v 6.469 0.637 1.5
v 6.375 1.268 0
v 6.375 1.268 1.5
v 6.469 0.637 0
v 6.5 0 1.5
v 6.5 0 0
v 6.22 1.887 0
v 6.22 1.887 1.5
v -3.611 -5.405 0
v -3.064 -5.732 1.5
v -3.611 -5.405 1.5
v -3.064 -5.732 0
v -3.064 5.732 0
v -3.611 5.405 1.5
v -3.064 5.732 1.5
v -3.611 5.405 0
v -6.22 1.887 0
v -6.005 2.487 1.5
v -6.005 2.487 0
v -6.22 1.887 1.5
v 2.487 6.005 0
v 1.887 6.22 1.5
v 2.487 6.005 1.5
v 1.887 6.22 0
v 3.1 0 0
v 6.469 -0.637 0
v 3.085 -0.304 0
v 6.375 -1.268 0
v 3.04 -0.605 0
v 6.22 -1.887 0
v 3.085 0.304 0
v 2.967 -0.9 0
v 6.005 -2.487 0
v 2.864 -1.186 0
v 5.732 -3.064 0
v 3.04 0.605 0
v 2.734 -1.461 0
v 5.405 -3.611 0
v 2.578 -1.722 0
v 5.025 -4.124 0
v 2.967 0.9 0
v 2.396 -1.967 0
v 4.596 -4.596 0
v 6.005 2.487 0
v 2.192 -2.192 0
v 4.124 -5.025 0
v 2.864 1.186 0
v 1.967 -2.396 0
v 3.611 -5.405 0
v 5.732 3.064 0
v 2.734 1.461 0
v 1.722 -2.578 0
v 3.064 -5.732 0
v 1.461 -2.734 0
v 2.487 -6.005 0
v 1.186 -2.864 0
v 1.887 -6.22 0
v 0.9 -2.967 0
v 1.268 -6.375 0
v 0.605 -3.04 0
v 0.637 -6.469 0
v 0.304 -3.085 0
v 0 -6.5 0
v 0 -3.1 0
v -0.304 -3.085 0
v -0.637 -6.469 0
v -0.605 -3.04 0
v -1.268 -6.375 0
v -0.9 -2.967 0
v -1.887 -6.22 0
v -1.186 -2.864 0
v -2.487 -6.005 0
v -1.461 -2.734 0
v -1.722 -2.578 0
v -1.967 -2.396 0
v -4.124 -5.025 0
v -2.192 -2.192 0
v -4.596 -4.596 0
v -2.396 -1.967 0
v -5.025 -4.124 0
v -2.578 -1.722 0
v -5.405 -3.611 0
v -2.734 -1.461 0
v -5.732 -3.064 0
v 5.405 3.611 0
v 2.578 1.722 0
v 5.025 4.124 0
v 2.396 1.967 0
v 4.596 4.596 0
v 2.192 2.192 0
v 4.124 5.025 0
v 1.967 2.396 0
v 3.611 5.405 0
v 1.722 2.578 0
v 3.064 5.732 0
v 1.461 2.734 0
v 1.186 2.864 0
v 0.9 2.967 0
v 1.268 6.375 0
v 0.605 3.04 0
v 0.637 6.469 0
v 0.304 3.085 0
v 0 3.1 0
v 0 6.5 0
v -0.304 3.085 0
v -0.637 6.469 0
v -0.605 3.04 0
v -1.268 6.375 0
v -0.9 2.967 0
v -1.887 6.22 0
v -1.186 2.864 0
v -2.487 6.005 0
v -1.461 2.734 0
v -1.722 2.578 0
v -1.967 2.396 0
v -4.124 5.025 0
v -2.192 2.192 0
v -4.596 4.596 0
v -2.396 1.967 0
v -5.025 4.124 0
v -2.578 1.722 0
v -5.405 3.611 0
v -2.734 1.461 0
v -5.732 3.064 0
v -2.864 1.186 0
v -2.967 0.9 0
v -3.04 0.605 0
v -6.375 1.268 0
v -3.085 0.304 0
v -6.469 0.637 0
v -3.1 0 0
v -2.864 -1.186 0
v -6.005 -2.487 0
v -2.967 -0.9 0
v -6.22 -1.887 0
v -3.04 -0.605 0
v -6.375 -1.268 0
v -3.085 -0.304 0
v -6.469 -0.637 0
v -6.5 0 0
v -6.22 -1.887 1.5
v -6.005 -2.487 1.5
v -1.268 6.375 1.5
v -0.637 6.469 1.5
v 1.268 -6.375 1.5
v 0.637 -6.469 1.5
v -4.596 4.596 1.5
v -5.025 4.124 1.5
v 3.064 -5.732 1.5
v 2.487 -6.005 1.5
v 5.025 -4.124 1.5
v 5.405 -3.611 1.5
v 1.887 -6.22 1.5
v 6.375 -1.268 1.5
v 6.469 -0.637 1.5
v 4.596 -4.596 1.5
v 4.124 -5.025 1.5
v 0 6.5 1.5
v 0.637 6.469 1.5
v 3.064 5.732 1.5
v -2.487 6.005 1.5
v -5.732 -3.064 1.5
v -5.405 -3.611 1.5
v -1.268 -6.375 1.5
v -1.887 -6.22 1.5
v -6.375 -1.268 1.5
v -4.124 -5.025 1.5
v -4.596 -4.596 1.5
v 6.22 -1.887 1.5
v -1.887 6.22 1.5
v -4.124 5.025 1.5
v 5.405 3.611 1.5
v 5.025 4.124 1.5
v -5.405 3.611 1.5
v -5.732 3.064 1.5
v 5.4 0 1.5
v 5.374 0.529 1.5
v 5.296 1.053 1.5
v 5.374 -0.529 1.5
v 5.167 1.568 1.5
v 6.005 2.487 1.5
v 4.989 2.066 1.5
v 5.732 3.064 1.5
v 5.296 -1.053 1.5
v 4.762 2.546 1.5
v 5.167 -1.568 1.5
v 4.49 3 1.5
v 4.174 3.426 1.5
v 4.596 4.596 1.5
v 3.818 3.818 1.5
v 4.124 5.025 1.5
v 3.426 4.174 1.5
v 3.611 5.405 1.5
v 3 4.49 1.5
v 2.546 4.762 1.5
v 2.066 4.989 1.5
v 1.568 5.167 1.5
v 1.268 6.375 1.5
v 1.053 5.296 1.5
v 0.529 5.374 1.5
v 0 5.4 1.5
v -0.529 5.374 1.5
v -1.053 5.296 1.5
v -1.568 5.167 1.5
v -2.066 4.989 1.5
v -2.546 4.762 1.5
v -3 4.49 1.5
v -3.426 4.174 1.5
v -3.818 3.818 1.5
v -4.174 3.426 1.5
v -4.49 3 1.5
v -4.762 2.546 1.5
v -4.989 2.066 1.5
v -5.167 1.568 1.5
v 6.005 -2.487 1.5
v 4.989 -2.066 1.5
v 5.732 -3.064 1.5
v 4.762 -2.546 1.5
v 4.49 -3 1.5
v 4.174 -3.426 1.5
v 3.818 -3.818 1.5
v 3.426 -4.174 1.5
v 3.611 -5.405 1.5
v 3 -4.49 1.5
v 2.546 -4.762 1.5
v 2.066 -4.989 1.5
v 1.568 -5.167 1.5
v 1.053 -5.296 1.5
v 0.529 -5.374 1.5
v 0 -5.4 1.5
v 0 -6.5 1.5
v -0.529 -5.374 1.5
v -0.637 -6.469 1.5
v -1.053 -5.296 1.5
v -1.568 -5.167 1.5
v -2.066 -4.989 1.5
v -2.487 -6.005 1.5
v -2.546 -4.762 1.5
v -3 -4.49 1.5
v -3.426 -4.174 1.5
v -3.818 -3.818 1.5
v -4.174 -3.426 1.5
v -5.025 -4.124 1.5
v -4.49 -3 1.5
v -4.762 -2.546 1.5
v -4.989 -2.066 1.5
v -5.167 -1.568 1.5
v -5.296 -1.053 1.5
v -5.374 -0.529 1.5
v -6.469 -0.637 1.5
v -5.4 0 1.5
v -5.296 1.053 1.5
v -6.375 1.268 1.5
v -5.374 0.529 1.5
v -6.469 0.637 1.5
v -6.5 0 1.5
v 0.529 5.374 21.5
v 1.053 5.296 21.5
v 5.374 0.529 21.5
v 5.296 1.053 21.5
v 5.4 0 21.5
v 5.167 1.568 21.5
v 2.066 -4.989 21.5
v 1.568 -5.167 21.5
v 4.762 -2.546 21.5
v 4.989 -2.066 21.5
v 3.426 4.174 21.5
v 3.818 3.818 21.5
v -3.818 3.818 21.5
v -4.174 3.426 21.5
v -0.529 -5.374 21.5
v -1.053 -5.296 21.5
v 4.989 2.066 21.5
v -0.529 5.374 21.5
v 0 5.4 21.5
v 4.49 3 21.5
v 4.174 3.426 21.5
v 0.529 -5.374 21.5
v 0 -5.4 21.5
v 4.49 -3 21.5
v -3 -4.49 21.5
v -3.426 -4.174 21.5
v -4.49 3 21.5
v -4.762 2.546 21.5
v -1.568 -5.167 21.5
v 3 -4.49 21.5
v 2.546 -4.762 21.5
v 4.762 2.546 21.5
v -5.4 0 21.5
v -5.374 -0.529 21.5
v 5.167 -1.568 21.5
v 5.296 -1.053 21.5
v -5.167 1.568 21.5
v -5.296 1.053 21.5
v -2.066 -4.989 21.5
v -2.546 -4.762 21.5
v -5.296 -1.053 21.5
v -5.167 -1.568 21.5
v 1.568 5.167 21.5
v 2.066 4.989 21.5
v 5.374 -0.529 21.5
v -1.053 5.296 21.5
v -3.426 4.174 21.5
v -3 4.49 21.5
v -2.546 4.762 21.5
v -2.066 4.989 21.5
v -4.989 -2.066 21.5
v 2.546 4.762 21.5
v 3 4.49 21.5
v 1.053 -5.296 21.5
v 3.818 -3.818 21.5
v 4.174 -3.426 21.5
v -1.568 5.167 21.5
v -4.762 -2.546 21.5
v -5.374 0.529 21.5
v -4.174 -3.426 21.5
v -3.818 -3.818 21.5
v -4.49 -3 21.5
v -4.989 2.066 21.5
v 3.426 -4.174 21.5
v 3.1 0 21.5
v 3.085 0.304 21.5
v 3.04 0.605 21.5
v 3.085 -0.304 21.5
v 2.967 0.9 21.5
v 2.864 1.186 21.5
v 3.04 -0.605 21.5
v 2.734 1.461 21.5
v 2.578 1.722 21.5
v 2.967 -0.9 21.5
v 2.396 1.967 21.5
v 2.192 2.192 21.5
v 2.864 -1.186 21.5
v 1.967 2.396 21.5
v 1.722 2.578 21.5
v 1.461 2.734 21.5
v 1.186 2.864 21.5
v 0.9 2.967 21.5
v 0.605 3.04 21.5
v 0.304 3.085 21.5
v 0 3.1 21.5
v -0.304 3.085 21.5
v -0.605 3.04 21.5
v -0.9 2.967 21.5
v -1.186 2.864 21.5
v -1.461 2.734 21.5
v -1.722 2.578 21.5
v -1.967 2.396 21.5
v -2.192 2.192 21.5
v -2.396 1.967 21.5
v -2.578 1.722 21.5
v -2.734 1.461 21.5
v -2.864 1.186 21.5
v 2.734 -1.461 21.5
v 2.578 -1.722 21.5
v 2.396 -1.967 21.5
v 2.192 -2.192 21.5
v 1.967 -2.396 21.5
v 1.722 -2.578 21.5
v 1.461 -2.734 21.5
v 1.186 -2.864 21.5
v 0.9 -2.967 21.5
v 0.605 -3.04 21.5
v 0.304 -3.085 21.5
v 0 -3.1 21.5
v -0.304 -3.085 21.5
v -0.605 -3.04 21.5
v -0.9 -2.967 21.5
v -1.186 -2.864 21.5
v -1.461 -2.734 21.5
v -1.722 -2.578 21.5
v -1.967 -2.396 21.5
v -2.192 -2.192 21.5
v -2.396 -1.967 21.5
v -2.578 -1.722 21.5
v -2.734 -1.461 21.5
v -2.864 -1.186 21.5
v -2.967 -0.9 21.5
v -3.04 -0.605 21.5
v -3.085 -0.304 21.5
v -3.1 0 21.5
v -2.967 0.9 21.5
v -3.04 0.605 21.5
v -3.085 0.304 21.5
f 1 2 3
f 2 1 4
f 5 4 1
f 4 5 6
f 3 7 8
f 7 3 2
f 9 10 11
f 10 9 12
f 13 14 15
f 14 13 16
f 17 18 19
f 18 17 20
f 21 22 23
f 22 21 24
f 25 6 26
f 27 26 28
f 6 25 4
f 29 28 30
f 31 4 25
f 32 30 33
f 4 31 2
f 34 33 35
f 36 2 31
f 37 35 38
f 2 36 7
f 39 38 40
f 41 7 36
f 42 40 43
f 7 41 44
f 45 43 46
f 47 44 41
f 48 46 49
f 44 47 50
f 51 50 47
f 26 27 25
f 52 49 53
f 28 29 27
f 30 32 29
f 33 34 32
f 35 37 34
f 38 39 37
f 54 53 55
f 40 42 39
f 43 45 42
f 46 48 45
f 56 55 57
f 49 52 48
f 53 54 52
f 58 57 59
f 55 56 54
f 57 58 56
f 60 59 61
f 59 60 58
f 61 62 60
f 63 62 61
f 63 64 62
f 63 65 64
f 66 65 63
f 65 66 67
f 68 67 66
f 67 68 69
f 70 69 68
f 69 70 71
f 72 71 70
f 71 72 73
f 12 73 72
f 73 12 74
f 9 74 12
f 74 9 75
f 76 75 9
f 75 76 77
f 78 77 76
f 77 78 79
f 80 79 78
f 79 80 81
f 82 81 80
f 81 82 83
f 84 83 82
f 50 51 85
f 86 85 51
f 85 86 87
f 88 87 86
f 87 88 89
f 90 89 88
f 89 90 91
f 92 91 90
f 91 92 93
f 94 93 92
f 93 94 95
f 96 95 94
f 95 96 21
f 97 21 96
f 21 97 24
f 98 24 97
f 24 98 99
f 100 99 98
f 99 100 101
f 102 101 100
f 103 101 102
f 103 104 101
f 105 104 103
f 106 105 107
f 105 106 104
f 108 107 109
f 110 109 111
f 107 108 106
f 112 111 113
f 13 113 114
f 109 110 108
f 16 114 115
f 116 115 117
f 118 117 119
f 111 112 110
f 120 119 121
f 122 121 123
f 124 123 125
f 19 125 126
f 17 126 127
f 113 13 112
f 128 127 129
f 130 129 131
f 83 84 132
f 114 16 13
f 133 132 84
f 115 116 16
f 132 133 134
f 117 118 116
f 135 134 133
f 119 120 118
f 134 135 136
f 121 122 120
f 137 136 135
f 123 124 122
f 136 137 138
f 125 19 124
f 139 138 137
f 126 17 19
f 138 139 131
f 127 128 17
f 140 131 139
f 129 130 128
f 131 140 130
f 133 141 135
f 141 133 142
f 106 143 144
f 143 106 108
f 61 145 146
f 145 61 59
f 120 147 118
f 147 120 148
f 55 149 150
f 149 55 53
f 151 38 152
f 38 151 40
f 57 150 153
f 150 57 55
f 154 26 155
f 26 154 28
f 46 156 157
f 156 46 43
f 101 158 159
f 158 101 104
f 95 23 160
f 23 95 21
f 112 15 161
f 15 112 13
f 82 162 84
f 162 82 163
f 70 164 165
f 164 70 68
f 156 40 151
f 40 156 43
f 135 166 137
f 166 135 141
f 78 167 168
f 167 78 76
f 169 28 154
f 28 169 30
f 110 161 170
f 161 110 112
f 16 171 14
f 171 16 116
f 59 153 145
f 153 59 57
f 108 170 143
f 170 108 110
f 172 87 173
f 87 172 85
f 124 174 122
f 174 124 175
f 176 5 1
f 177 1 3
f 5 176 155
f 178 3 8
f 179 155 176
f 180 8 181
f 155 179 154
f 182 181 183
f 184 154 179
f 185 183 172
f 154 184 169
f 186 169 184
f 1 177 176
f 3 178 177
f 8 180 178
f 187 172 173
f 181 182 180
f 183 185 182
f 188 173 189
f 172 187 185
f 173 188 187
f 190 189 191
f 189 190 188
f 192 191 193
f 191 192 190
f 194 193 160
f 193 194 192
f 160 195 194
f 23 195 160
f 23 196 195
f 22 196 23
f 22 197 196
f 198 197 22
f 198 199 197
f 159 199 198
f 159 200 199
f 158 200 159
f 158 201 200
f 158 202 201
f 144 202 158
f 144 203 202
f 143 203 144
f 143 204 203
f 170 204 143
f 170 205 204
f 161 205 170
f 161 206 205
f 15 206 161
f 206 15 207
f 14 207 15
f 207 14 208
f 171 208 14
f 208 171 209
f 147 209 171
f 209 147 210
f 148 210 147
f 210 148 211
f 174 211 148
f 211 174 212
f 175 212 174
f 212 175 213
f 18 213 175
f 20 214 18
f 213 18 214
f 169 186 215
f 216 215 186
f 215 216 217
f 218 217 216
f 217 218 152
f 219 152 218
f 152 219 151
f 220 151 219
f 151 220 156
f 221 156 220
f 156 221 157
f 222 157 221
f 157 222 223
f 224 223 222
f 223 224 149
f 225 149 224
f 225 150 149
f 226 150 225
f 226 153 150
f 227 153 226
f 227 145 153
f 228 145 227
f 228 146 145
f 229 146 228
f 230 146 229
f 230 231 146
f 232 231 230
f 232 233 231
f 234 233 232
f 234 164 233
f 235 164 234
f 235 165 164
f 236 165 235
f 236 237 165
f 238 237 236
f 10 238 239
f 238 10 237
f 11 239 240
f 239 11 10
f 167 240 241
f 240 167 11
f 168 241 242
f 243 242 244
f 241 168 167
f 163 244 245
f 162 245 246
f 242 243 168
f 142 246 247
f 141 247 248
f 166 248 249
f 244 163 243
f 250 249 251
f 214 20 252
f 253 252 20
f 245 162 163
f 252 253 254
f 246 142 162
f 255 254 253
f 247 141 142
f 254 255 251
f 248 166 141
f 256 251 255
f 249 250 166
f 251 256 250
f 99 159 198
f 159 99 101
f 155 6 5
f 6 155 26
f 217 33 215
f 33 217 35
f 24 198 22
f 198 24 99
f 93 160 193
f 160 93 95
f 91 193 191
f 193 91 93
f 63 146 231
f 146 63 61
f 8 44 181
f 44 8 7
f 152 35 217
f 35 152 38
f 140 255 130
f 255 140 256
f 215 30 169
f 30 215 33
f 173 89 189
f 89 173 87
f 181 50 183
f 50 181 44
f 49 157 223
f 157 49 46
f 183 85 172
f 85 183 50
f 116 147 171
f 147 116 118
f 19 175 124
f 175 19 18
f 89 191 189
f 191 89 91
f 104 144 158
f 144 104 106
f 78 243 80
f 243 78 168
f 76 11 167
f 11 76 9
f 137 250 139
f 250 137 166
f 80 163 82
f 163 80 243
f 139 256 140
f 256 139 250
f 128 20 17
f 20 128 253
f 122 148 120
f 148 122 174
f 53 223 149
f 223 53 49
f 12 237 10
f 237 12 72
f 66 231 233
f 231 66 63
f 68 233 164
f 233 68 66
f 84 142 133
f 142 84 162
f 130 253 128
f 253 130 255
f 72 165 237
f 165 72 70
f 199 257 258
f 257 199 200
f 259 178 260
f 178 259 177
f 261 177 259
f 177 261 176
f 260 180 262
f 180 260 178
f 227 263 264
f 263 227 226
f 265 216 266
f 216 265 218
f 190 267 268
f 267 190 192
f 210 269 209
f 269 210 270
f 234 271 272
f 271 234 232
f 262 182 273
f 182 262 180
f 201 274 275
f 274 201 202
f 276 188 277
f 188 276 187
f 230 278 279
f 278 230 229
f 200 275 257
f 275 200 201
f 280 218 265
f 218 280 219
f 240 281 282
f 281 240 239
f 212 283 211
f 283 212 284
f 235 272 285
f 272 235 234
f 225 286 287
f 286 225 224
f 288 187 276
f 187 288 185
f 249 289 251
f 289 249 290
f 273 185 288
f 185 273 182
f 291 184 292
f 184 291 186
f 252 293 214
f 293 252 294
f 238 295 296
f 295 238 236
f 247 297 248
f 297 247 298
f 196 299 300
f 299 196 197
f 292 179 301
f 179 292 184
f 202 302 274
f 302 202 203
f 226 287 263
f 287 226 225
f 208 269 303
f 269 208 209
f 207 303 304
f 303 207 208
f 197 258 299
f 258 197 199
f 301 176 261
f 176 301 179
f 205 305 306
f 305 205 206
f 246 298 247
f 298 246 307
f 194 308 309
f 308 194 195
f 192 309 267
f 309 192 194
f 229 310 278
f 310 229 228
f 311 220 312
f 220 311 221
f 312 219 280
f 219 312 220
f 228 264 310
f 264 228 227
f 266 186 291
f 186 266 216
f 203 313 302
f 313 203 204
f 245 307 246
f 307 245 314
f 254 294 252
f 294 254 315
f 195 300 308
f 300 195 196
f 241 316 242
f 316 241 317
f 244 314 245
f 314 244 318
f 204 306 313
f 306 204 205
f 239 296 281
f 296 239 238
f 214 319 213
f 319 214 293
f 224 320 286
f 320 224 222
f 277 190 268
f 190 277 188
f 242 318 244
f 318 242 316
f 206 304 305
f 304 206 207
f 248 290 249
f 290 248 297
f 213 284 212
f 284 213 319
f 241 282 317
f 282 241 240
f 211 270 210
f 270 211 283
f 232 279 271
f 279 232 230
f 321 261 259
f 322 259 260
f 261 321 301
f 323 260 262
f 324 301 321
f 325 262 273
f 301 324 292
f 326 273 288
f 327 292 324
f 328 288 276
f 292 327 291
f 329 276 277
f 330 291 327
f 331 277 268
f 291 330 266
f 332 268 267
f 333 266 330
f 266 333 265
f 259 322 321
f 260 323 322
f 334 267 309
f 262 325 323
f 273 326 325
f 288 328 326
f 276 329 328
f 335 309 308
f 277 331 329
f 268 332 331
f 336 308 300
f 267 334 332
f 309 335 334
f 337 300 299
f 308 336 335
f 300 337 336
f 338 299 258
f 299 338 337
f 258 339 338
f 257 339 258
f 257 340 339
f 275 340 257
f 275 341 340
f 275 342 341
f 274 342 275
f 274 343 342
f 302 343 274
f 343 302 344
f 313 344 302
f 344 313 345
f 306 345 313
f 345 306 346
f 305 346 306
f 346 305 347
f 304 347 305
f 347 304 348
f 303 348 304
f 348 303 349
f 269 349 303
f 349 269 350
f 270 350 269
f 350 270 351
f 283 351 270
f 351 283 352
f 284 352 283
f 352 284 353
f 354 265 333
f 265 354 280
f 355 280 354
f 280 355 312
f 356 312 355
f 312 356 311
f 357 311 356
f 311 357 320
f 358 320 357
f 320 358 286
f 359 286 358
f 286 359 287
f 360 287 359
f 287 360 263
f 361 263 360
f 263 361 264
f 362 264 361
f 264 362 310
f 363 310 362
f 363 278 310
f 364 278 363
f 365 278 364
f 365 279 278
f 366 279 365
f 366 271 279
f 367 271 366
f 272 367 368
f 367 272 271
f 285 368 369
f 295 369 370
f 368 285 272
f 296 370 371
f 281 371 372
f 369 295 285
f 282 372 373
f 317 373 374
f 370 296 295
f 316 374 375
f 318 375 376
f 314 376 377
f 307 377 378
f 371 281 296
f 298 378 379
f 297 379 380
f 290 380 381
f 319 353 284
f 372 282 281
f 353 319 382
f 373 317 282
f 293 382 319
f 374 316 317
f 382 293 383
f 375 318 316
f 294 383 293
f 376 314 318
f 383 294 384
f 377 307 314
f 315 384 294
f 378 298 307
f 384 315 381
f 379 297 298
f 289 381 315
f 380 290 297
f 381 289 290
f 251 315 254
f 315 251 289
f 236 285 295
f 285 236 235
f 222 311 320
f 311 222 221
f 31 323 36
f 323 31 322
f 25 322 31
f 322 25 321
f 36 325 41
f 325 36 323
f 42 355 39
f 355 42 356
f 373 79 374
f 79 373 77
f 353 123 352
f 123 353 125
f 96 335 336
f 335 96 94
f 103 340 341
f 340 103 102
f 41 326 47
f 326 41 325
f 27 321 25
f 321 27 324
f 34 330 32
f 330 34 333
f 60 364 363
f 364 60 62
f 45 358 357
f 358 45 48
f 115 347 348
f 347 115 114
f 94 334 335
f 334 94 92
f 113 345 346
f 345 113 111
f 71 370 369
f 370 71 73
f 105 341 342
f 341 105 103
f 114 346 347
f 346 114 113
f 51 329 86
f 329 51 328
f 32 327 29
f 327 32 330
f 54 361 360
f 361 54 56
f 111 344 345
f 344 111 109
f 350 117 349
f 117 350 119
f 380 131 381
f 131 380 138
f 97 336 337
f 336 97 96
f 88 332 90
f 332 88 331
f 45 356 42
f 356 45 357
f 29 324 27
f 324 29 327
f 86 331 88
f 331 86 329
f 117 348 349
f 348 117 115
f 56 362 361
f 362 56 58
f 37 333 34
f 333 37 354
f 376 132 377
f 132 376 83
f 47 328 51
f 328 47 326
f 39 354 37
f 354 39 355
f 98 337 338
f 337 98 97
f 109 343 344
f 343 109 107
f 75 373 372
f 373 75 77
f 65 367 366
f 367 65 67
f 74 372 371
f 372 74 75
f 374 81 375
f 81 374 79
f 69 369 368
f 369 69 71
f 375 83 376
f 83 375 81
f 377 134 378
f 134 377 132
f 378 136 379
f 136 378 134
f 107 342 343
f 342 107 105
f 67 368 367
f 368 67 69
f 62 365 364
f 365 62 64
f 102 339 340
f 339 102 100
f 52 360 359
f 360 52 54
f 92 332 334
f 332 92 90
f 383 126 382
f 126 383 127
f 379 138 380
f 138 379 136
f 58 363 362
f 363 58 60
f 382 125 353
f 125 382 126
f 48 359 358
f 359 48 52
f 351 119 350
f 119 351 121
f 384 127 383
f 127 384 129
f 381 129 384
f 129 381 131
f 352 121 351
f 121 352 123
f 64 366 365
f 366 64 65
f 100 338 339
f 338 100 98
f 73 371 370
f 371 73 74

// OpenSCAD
$fn = 64;

// Define dimensions
collar_diameter = 13;  // Diameter of the collar
collar_height = 1.5;   // Thickness of the collar (height)
sleeve_outer_diameter = 10.8;  // Outer diameter of the sleeve body
sleeve_height = 20;    // Height of the sleeve body
bore_diameter = 6.2;  // Diameter of the bore
bore_length = 21.5;   // Total length of the bore through the adapter

difference() {
  union() {
    // Collar: a thick cylinder (13mm diameter, 1.5mm height)
    cylinder(d=collar_diameter, h=collar_height, $fn=64);
    
    // Sleeve body: a smaller cylinder (10.8mm diameter) rising from the collar
    translate([0, 0, collar_height]) 
      cylinder(d=sleeve_outer_diameter, h=sleeve_height, $fn=64);
  }
  
  // Bore: a straight cylinder (6.2mm diameter) through the full height
  cylinder(d=bore_diameter, h=bore_length, $fn=64);
}
